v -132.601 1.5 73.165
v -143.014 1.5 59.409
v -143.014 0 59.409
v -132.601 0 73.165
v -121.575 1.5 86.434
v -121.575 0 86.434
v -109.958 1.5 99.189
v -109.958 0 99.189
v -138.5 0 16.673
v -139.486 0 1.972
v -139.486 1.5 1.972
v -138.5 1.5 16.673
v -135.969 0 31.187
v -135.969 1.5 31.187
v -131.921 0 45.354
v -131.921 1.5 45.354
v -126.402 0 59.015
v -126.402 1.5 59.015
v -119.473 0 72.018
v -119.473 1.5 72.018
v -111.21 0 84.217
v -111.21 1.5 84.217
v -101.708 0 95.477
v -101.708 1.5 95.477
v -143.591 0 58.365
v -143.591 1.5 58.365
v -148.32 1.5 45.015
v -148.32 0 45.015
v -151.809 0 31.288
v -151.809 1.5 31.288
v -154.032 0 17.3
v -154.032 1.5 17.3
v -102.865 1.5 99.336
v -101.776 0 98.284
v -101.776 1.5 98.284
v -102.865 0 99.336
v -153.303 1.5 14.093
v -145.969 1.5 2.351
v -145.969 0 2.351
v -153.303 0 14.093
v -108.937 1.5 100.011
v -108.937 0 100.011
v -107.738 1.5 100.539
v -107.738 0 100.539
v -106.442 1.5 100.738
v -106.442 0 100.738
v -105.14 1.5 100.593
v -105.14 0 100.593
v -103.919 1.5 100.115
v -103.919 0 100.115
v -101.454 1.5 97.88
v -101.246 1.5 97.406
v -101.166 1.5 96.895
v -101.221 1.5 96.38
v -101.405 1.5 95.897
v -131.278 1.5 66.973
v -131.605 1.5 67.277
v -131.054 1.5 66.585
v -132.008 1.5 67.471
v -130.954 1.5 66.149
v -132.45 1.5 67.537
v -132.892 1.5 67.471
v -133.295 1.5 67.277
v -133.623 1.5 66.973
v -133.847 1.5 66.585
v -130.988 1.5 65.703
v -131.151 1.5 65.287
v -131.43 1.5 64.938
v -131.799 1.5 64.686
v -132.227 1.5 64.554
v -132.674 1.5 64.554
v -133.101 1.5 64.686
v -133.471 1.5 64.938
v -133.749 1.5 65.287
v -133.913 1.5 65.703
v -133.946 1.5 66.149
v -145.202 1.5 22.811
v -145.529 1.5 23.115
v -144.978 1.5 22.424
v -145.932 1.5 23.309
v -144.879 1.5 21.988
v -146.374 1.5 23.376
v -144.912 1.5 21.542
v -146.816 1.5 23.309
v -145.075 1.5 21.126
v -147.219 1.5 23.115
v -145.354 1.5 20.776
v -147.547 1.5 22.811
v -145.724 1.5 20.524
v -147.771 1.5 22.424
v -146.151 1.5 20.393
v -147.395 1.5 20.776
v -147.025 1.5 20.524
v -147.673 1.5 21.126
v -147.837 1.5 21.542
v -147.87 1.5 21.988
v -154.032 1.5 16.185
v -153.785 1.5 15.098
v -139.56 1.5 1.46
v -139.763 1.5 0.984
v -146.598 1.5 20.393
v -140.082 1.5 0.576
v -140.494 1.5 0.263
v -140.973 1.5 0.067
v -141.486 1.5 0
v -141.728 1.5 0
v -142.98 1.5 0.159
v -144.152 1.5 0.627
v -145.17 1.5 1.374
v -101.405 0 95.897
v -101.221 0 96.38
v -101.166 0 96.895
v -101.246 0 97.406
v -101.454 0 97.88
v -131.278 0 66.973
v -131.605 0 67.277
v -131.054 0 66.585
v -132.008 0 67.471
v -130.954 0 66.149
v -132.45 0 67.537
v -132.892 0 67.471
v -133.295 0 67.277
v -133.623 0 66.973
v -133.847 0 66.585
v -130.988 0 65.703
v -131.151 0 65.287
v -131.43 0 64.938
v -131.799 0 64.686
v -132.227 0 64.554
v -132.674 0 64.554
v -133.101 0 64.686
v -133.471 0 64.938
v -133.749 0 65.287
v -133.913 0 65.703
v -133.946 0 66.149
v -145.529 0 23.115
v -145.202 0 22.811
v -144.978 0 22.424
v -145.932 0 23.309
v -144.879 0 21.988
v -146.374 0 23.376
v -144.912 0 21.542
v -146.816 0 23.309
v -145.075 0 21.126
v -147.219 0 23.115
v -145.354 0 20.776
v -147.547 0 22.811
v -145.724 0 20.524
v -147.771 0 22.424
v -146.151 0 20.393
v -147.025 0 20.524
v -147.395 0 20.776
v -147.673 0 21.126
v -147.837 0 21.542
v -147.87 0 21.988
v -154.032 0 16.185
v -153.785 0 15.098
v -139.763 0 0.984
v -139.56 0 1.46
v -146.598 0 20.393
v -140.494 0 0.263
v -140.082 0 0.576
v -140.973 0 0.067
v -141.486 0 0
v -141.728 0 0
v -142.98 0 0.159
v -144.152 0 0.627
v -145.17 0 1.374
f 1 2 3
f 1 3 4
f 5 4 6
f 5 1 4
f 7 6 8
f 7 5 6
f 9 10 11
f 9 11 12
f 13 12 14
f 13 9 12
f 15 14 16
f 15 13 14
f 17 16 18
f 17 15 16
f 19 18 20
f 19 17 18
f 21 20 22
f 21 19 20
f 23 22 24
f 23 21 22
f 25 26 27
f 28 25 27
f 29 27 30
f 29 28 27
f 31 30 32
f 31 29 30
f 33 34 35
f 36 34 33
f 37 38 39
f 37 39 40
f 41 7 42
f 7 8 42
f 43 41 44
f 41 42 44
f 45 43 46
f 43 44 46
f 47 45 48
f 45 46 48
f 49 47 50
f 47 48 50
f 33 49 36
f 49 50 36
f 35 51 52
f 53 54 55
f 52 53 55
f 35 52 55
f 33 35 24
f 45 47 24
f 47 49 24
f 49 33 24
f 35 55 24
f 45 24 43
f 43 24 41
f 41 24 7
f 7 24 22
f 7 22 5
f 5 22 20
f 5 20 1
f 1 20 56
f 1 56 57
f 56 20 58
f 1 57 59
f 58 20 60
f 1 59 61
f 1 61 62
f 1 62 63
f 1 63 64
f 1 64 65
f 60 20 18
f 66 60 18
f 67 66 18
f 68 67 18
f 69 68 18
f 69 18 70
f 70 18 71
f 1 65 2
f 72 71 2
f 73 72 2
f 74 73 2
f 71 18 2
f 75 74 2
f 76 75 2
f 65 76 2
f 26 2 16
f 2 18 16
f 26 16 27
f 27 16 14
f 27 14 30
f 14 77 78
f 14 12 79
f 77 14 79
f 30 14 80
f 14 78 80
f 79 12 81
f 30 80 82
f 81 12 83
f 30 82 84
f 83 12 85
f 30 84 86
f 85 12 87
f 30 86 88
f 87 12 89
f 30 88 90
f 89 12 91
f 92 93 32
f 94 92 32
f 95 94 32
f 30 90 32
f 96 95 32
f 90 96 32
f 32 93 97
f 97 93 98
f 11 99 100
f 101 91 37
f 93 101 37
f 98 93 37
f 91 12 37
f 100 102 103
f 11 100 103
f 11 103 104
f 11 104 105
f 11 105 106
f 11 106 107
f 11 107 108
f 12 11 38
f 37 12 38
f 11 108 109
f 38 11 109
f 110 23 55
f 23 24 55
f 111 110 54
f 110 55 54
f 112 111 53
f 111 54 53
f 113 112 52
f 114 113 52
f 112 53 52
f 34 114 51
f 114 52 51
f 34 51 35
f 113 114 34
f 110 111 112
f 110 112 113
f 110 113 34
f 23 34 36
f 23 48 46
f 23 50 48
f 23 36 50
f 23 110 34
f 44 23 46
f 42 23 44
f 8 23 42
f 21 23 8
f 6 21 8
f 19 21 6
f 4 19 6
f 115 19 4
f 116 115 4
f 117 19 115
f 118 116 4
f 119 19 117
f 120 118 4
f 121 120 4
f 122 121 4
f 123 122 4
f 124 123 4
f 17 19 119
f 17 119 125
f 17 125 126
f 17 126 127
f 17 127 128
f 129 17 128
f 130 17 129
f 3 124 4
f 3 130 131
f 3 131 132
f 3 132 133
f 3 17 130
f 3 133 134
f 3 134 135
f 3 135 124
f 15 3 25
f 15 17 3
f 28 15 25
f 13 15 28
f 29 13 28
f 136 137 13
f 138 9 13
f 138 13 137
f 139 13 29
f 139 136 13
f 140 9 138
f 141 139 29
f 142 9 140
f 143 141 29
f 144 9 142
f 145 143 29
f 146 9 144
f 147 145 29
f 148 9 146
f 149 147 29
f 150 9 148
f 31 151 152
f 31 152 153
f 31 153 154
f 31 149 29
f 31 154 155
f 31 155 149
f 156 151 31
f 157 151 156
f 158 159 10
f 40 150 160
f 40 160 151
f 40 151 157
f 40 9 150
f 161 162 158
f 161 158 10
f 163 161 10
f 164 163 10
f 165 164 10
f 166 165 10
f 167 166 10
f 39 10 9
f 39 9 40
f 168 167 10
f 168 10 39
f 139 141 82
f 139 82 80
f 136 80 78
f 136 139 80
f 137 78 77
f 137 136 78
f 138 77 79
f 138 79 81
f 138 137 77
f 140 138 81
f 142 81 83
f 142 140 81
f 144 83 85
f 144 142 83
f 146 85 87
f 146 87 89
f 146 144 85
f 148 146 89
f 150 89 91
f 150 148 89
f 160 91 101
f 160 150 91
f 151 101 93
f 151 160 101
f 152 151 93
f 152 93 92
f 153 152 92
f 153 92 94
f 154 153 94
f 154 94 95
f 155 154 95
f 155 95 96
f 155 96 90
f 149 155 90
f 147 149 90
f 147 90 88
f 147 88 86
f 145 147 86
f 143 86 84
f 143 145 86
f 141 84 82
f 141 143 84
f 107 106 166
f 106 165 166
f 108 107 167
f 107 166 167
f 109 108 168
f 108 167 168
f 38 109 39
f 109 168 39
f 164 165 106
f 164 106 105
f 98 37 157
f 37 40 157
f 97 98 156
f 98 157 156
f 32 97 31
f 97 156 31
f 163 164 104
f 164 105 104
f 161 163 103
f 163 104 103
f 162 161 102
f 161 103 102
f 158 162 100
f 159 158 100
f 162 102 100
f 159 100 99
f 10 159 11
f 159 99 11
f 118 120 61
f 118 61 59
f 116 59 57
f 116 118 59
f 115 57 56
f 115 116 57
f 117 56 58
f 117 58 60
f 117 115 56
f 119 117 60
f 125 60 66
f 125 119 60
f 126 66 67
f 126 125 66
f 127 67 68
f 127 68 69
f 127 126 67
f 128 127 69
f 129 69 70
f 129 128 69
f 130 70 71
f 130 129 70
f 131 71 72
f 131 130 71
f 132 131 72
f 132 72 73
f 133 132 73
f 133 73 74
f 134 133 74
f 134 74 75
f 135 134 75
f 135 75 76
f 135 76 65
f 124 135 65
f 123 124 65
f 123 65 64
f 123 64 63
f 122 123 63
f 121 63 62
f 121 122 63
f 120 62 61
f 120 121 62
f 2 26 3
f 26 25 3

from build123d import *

# Parameters (mm, degrees)
ESQUISSE1_R             = 1.5
BOSS_EXTRU_1_DEPTH      = 1.5
ENL_V_MAT_EXTRU_1_DEPTH = 189.733992158
CONG_1_R                = 5
CONG_2_R                = 2


with BuildPart() as part:
    # Esquisse1 → Boss.-Extru.1 (new body)
    with BuildSketch(Plane(origin=(0, 0, 0), x_dir=(1, 0, 0), z_dir=(0, 1, 0))):
        with BuildLine():
            Line((-155, 0), (-139.5, 0))
            ThreePointArc((-139.5, 0), (-129.342147712, -52.257619782), (-100.347902147, -96.904842679))
            Line((-100.347902147, -96.904842679), (-111.497669052, -107.672047421))
            ThreePointArc((-111.497669052, -107.672047421), (-143.713497458, -58.064021979), (-155, 0))
        make_face()
        with Locations(Location((-146.374347778, -21.875792847, 0), (0, 0, 270))):
            Circle(ESQUISSE1_R, mode=Mode.SUBTRACT)
        with Locations(Location((-132.450285517, -66.03727634, 0), (0, 0, 270))):
            Circle(ESQUISSE1_R, mode=Mode.SUBTRACT)
    extrude(amount=BOSS_EXTRU_1_DEPTH)

    # Esquisse2 → Enlèv. mat.-Extru.1 (cut, through all)
    with BuildSketch(Plane(origin=(0, 1.5, 0), x_dir=(1, 0, 0), z_dir=(0, 1, 0))):
        with BuildLine():
            Line((-155, 0), (-144.5, 0))
            Line((-144.5, 0), (-154.217397717, -15.556164093))
            ThreePointArc((-154.217397717, -15.556164093), (-154.804225792, -7.78791865), (-155, 0))
        make_face()
        with BuildLine():
            Line((-106.461511638, -102.808686738), (-111.497669052, -107.672047421))
            ThreePointArc((-111.497669052, -107.672047421), (-129.740451706, -84.808108051), (-143.363022468, -58.924051021))
            ThreePointArc((-143.363022468, -58.924051021), (-125.74115641, -81.563361553), (-106.461511638, -102.808686738))
        make_face()
    extrude(amount=-ENL_V_MAT_EXTRU_1_DEPTH, mode=Mode.SUBTRACT)

    # Congé1
    cong_1_edges = [part.edges().sort_by_distance(p)[0] for p in [
        (-154.217397717, 0.75, 15.556164093),
        (-144.5, 0.75, 0),
        (-143.363022468, 0.75, 58.924051021),
        (-106.461511638, 0.75, 102.808686738),
    ]]
    fillet(cong_1_edges, radius=CONG_1_R)

    # Congé2
    cong_2_edges = [part.edges().sort_by_distance(p)[0] for p in [
        (-100.347902147, 0.75, 96.904842679),
        (-139.5, 0.75, 0),
    ]]
    fillet(cong_2_edges, radius=CONG_2_R)


solid = part.part
